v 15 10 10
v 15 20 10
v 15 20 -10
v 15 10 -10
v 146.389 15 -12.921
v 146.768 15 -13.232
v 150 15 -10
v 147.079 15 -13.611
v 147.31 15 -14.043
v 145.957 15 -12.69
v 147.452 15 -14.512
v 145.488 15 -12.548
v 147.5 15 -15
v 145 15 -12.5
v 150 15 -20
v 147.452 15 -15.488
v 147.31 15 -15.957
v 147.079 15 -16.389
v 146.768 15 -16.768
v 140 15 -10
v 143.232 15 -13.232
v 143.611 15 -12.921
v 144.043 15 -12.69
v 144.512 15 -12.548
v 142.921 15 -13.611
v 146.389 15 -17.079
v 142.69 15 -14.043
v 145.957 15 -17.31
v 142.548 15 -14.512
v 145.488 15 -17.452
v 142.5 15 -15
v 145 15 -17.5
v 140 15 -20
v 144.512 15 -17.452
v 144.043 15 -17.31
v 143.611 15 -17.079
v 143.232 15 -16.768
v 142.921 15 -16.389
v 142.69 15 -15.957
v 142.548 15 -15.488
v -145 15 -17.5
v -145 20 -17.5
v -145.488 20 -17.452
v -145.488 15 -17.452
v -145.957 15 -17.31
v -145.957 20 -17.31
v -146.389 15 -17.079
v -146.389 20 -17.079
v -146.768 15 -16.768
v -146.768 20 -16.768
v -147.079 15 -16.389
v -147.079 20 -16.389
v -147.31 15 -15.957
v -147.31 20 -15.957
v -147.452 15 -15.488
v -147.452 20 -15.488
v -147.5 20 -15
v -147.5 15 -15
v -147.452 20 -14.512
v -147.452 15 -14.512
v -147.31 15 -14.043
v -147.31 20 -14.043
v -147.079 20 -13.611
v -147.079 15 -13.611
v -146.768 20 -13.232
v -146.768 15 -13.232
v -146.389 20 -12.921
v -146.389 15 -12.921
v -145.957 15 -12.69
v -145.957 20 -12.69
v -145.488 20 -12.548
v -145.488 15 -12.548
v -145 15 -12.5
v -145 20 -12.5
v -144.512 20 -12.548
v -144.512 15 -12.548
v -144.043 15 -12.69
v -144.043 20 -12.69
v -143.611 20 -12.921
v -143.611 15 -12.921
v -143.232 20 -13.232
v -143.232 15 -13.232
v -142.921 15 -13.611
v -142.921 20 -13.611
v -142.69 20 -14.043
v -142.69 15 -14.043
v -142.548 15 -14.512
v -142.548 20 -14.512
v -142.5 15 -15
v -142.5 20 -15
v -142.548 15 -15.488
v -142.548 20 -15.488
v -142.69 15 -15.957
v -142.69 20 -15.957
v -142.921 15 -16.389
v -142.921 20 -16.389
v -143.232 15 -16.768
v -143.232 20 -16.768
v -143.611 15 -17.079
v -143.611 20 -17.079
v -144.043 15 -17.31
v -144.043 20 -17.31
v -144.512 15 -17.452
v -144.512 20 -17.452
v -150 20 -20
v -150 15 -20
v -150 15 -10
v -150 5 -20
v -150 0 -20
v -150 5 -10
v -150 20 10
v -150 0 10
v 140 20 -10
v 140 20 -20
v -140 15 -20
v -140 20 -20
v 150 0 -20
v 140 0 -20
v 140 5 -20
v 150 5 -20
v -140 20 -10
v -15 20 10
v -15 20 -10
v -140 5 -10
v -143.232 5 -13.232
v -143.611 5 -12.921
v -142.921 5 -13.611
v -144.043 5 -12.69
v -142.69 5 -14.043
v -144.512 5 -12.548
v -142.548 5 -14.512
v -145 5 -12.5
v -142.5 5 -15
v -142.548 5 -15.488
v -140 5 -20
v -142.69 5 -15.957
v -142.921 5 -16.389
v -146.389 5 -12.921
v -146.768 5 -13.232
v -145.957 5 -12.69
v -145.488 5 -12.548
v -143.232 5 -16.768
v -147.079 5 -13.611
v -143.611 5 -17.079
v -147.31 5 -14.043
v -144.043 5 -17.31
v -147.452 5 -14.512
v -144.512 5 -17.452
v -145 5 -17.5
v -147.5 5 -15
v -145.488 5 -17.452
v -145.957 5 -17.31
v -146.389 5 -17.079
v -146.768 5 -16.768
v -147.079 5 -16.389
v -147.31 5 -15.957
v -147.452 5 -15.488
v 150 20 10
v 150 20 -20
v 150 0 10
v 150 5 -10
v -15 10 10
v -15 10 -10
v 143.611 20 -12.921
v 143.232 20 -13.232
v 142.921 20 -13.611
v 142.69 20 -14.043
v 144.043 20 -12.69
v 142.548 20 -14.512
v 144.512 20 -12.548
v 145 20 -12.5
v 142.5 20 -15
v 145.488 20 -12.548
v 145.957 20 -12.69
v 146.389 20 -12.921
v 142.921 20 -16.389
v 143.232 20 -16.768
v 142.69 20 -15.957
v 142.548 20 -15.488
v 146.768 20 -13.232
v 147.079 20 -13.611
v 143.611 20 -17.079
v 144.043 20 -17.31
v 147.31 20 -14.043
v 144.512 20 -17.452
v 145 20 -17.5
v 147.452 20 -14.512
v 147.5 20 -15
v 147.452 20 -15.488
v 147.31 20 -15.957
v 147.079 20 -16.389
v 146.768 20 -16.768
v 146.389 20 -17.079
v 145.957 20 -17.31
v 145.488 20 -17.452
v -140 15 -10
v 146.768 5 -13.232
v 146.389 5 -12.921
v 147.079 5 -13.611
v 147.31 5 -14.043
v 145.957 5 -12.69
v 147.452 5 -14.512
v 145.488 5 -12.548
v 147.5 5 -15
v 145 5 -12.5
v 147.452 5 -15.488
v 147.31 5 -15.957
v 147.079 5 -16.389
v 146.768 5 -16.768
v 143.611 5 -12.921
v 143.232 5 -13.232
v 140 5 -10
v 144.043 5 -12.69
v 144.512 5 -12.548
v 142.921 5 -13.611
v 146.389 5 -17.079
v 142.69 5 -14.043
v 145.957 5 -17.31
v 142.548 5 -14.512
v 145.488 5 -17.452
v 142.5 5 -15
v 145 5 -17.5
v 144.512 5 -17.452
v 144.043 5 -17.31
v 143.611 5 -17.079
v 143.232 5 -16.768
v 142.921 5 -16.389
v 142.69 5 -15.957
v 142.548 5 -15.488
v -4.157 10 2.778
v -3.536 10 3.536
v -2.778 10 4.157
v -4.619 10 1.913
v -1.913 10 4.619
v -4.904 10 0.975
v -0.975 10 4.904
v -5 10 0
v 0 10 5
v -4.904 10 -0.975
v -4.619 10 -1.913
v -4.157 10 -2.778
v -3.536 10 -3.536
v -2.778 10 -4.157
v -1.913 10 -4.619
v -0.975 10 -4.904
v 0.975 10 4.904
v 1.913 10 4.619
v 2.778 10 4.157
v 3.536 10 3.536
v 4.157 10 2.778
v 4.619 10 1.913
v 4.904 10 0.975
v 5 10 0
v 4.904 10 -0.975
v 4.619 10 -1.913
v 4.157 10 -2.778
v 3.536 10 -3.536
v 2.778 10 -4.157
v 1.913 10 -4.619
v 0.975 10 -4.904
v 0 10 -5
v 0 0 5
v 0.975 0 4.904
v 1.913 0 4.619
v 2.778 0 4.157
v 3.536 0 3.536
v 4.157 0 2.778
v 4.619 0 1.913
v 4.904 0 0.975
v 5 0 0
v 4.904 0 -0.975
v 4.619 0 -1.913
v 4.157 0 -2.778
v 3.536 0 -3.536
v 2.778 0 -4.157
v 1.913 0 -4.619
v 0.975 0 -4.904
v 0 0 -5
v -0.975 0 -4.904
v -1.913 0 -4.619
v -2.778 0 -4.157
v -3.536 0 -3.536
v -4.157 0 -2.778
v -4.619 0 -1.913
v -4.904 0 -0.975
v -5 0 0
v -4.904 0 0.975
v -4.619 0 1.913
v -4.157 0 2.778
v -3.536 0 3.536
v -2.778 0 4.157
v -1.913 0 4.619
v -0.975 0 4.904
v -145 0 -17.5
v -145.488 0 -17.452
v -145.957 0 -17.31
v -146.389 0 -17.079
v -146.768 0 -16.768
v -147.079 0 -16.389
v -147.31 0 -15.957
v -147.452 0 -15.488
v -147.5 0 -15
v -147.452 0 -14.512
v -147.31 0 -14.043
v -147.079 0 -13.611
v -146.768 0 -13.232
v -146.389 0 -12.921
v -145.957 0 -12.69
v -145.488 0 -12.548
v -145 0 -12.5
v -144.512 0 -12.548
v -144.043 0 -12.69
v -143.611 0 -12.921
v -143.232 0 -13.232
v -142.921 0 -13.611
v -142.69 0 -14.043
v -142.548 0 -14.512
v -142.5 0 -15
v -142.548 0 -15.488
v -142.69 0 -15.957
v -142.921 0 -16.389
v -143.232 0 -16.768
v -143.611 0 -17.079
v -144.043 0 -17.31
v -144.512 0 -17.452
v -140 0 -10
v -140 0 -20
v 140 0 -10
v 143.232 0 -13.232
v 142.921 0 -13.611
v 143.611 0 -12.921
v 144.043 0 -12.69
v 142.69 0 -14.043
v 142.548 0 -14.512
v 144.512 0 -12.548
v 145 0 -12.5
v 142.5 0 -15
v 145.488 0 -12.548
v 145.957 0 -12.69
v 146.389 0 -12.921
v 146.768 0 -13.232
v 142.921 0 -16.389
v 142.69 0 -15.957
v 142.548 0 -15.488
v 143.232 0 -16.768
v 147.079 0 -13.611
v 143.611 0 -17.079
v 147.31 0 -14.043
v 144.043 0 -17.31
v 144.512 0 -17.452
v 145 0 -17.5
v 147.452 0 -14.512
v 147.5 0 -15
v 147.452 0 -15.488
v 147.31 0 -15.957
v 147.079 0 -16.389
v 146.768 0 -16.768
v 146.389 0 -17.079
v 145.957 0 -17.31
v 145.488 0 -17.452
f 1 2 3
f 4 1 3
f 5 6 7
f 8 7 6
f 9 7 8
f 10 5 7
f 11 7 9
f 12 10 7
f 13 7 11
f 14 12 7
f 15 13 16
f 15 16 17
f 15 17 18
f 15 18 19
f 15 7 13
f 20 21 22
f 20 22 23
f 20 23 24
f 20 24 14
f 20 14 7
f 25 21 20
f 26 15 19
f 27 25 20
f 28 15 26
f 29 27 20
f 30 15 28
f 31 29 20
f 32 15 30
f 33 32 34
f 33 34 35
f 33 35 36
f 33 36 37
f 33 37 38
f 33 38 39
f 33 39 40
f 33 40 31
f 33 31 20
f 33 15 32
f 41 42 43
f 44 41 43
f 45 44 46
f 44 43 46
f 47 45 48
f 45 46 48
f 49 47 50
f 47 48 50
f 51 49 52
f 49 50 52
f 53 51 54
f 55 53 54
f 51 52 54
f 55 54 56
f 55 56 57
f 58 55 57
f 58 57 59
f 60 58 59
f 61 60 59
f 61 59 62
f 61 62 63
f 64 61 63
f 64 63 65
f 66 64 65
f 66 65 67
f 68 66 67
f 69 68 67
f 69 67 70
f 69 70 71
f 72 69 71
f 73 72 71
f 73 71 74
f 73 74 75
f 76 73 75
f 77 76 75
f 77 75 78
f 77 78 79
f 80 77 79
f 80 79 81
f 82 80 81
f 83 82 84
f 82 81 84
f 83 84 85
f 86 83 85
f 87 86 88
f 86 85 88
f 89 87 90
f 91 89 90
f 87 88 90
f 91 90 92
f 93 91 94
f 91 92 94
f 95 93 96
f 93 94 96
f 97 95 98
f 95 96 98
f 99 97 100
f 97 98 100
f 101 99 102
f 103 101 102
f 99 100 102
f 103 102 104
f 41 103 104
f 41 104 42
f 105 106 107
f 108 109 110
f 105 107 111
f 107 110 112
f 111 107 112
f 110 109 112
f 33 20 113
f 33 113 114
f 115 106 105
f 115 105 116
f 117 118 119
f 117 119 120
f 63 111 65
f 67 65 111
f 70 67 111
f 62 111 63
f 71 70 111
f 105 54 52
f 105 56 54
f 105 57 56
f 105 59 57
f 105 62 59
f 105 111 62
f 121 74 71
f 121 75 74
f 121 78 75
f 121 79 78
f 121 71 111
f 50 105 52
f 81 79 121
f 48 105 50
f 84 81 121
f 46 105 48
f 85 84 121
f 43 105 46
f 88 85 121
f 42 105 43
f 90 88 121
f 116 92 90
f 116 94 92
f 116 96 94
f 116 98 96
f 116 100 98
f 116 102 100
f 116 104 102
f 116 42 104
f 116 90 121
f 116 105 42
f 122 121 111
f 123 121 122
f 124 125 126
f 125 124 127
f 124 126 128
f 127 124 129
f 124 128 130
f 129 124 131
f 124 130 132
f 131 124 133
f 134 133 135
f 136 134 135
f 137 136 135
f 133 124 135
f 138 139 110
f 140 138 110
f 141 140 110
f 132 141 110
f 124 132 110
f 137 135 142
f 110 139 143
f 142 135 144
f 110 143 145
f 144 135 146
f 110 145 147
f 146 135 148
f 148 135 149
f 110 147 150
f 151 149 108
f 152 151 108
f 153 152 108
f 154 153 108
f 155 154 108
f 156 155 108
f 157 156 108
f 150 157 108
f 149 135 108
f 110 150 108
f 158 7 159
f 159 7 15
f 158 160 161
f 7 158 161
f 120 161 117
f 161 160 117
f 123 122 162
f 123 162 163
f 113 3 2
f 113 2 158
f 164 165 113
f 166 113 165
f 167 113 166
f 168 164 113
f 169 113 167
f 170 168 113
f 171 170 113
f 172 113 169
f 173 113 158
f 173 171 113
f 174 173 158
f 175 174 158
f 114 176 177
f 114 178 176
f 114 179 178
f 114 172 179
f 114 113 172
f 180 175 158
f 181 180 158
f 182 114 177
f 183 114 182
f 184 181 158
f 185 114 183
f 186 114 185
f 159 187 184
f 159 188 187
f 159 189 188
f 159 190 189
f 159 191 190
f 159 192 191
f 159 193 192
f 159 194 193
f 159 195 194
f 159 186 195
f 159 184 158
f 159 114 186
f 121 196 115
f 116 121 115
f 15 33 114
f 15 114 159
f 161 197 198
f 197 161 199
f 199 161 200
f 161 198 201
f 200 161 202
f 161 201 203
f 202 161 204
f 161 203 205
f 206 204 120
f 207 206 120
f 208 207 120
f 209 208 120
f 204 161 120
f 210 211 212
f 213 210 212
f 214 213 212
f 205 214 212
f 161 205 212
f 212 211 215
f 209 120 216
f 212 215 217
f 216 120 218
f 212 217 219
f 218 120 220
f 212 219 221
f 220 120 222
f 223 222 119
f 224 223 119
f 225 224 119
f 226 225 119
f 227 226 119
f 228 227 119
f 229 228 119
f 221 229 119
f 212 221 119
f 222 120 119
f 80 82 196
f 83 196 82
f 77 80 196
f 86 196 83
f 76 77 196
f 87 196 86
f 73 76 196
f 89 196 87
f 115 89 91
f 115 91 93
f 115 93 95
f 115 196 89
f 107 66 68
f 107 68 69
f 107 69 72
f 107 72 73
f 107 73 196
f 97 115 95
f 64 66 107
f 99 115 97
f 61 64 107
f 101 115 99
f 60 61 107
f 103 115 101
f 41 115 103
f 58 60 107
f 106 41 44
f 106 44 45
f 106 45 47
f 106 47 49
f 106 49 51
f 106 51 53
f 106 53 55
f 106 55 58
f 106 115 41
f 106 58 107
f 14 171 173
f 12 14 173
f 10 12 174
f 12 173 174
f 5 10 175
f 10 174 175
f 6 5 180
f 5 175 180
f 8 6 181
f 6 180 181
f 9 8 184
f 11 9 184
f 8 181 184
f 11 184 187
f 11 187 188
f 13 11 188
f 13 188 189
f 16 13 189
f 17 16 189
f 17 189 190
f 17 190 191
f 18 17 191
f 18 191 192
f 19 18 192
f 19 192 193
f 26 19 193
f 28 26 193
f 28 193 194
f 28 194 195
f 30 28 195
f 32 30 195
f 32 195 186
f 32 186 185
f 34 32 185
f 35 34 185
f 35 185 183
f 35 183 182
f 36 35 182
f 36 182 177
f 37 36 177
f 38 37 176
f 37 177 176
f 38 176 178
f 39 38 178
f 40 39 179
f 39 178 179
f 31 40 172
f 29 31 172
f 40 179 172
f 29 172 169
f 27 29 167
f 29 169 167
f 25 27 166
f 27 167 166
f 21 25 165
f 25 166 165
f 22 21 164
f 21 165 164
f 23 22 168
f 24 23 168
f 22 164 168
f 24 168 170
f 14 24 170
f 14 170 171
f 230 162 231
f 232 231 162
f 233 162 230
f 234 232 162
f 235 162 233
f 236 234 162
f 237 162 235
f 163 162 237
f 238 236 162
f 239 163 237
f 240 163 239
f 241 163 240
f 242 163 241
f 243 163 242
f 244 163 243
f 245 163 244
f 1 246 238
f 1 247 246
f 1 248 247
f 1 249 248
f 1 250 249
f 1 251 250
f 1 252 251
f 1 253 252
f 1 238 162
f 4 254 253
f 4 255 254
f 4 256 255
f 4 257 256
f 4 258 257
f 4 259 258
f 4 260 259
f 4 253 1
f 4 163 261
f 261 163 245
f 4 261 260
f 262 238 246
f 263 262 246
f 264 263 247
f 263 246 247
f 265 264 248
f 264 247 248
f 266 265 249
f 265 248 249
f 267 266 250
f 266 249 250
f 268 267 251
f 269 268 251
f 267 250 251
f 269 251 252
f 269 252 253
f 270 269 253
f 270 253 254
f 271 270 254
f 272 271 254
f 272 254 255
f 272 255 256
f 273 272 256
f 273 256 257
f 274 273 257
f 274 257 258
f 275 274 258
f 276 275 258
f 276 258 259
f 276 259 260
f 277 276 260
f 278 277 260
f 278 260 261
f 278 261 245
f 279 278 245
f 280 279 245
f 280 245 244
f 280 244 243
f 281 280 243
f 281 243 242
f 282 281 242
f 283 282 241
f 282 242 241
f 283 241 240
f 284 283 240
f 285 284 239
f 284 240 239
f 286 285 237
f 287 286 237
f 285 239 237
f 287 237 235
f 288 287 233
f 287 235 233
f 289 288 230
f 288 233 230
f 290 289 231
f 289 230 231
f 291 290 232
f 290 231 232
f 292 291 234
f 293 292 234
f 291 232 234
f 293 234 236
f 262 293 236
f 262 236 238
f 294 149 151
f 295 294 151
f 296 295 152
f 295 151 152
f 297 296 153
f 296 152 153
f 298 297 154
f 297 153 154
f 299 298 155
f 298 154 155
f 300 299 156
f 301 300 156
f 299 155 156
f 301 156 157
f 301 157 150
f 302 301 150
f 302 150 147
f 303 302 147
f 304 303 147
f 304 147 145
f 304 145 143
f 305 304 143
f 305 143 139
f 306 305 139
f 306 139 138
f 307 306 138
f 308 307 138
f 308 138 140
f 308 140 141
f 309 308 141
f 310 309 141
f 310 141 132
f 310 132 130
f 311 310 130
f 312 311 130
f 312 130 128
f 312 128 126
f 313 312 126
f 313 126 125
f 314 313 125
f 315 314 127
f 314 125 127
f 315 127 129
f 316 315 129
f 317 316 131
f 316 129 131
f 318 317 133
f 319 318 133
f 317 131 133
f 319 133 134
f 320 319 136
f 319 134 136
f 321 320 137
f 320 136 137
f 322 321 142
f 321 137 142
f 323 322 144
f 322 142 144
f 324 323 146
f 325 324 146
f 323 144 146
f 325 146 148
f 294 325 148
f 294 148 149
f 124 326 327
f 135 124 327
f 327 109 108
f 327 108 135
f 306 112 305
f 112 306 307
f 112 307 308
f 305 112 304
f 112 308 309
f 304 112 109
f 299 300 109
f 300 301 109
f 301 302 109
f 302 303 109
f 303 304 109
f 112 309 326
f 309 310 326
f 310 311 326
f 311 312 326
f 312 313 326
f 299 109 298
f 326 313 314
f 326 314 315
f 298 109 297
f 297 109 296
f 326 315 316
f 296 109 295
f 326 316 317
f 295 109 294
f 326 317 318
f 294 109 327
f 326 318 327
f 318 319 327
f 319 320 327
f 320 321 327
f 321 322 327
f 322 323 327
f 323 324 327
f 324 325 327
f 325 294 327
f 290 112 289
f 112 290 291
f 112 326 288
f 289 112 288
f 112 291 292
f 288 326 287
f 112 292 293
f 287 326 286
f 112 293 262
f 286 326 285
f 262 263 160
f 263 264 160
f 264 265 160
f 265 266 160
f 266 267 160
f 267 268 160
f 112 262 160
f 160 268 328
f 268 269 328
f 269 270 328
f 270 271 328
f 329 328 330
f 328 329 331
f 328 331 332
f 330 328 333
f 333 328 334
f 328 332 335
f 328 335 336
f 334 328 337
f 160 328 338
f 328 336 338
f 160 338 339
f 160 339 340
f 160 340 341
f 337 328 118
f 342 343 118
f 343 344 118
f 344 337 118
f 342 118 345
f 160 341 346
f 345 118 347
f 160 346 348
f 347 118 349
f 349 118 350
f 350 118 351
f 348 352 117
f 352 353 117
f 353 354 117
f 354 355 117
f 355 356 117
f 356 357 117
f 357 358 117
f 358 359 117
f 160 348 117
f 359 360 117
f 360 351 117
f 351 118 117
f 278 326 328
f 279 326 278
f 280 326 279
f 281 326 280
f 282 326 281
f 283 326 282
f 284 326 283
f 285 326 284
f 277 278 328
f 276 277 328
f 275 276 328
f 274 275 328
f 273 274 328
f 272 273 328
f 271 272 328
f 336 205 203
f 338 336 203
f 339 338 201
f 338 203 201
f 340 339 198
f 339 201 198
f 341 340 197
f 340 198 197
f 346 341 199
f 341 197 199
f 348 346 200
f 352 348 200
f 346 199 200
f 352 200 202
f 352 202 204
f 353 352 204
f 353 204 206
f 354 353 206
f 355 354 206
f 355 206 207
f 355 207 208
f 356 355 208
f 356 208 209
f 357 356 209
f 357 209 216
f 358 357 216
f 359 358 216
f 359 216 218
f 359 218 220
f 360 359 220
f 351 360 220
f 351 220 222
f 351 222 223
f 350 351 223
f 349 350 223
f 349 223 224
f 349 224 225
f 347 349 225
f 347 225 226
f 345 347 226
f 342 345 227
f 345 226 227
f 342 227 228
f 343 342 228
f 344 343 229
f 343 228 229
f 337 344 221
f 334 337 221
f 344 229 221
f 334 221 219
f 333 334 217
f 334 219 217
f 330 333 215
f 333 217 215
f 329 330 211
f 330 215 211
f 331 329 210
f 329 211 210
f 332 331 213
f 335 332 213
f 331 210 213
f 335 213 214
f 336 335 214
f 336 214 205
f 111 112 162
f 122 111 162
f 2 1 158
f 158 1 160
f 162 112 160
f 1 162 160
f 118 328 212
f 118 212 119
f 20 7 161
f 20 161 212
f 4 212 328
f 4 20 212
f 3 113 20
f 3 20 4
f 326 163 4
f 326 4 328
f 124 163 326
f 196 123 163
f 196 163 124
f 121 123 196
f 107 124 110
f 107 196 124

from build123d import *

# Parameters (mm, degrees)
SKETCH1_W           = 300
SKETCH1_H           = 20
SKETCH1_W_2         = 10
SKETCH1_H_2         = 10
BOSS_EXTRUDE1_DEPTH = 20
SKETCH6_W           = 10
SKETCH6_H           = 10
CUT_EXTRUDE5_DEPTH  = 10
SKETCH2_W           = 30
SKETCH2_H           = 20
CUT_EXTRUDE1_DEPTH  = 10
SKETCH4_R           = 2.5
CUT_EXTRUDE3_DEPTH  = 153.643375225
CUT_EXTRUDE4_REACH  = 153.658
SKETCH5_R           = 5


with BuildPart() as part:
    # Sketch1 → Boss-Extrude1 (new body)
    with BuildSketch(Plane(origin=(0, 0, 0), x_dir=(1, 0, 0), z_dir=(0, 1, 0))):
        Rectangle(SKETCH1_W, SKETCH1_H)
        with Locations((-145, 15)):
            Rectangle(SKETCH1_W_2, SKETCH1_H_2)
        with Locations((145, 15)):
            Rectangle(SKETCH1_W_2, SKETCH1_H_2)
    extrude(amount=BOSS_EXTRUDE1_DEPTH)

    # Sketch6 → Cut-Extrude5 (cut)
    with BuildSketch(Plane(origin=(0, 0, -20), x_dir=(-1, 0, 0), z_dir=(0, 0, -1))):
        with Locations((-145, 10)):
            Rectangle(SKETCH6_W, SKETCH6_H)
        with Locations((145, 10)):
            Rectangle(SKETCH6_W, SKETCH6_H)
    extrude(amount=-CUT_EXTRUDE5_DEPTH, mode=Mode.SUBTRACT)

    # Sketch2 → Cut-Extrude1 (cut)
    with BuildSketch(Plane(origin=(0, 20, 0), x_dir=(1, 0, 0), z_dir=(0, 1, 0))):
        Rectangle(SKETCH2_W, SKETCH2_H)
    extrude(amount=-CUT_EXTRUDE1_DEPTH, mode=Mode.SUBTRACT)

    # Sketch4 → Cut-Extrude3 (cut, through all)
    with BuildSketch(Plane(origin=(0, 20, 0), x_dir=(1, 0, 0), z_dir=(0, 1, 0))):
        with Locations(Location((-145, 15, 0), (0, 0, 90))):
            Circle(SKETCH4_R)
        with Locations(Location((145, 15, 0), (0, 0, 270))):
            Circle(SKETCH4_R)
    extrude(amount=-CUT_EXTRUDE3_DEPTH, mode=Mode.SUBTRACT)

    # Sketch5 → Cut-Extrude4 (cut, up to next)
    with BuildSketch(Plane(origin=(0, 10, 0), x_dir=(1, 0, 0), z_dir=(0, 1, 0)), mode=Mode.PRIVATE) as cut_extrude4_sk1:
        with Locations(Location((0, 0, 0), (0, 0, 270))):
            Circle(SKETCH5_R)
    cut_extrude4_tool1 = extrude(cut_extrude4_sk1.sketch, amount=-CUT_EXTRUDE4_REACH, mode=Mode.PRIVATE) & part.part
    add(cut_extrude4_tool1.solids().sort_by_distance((0, 10, 0))[0], mode=Mode.SUBTRACT)


solid = part.part
